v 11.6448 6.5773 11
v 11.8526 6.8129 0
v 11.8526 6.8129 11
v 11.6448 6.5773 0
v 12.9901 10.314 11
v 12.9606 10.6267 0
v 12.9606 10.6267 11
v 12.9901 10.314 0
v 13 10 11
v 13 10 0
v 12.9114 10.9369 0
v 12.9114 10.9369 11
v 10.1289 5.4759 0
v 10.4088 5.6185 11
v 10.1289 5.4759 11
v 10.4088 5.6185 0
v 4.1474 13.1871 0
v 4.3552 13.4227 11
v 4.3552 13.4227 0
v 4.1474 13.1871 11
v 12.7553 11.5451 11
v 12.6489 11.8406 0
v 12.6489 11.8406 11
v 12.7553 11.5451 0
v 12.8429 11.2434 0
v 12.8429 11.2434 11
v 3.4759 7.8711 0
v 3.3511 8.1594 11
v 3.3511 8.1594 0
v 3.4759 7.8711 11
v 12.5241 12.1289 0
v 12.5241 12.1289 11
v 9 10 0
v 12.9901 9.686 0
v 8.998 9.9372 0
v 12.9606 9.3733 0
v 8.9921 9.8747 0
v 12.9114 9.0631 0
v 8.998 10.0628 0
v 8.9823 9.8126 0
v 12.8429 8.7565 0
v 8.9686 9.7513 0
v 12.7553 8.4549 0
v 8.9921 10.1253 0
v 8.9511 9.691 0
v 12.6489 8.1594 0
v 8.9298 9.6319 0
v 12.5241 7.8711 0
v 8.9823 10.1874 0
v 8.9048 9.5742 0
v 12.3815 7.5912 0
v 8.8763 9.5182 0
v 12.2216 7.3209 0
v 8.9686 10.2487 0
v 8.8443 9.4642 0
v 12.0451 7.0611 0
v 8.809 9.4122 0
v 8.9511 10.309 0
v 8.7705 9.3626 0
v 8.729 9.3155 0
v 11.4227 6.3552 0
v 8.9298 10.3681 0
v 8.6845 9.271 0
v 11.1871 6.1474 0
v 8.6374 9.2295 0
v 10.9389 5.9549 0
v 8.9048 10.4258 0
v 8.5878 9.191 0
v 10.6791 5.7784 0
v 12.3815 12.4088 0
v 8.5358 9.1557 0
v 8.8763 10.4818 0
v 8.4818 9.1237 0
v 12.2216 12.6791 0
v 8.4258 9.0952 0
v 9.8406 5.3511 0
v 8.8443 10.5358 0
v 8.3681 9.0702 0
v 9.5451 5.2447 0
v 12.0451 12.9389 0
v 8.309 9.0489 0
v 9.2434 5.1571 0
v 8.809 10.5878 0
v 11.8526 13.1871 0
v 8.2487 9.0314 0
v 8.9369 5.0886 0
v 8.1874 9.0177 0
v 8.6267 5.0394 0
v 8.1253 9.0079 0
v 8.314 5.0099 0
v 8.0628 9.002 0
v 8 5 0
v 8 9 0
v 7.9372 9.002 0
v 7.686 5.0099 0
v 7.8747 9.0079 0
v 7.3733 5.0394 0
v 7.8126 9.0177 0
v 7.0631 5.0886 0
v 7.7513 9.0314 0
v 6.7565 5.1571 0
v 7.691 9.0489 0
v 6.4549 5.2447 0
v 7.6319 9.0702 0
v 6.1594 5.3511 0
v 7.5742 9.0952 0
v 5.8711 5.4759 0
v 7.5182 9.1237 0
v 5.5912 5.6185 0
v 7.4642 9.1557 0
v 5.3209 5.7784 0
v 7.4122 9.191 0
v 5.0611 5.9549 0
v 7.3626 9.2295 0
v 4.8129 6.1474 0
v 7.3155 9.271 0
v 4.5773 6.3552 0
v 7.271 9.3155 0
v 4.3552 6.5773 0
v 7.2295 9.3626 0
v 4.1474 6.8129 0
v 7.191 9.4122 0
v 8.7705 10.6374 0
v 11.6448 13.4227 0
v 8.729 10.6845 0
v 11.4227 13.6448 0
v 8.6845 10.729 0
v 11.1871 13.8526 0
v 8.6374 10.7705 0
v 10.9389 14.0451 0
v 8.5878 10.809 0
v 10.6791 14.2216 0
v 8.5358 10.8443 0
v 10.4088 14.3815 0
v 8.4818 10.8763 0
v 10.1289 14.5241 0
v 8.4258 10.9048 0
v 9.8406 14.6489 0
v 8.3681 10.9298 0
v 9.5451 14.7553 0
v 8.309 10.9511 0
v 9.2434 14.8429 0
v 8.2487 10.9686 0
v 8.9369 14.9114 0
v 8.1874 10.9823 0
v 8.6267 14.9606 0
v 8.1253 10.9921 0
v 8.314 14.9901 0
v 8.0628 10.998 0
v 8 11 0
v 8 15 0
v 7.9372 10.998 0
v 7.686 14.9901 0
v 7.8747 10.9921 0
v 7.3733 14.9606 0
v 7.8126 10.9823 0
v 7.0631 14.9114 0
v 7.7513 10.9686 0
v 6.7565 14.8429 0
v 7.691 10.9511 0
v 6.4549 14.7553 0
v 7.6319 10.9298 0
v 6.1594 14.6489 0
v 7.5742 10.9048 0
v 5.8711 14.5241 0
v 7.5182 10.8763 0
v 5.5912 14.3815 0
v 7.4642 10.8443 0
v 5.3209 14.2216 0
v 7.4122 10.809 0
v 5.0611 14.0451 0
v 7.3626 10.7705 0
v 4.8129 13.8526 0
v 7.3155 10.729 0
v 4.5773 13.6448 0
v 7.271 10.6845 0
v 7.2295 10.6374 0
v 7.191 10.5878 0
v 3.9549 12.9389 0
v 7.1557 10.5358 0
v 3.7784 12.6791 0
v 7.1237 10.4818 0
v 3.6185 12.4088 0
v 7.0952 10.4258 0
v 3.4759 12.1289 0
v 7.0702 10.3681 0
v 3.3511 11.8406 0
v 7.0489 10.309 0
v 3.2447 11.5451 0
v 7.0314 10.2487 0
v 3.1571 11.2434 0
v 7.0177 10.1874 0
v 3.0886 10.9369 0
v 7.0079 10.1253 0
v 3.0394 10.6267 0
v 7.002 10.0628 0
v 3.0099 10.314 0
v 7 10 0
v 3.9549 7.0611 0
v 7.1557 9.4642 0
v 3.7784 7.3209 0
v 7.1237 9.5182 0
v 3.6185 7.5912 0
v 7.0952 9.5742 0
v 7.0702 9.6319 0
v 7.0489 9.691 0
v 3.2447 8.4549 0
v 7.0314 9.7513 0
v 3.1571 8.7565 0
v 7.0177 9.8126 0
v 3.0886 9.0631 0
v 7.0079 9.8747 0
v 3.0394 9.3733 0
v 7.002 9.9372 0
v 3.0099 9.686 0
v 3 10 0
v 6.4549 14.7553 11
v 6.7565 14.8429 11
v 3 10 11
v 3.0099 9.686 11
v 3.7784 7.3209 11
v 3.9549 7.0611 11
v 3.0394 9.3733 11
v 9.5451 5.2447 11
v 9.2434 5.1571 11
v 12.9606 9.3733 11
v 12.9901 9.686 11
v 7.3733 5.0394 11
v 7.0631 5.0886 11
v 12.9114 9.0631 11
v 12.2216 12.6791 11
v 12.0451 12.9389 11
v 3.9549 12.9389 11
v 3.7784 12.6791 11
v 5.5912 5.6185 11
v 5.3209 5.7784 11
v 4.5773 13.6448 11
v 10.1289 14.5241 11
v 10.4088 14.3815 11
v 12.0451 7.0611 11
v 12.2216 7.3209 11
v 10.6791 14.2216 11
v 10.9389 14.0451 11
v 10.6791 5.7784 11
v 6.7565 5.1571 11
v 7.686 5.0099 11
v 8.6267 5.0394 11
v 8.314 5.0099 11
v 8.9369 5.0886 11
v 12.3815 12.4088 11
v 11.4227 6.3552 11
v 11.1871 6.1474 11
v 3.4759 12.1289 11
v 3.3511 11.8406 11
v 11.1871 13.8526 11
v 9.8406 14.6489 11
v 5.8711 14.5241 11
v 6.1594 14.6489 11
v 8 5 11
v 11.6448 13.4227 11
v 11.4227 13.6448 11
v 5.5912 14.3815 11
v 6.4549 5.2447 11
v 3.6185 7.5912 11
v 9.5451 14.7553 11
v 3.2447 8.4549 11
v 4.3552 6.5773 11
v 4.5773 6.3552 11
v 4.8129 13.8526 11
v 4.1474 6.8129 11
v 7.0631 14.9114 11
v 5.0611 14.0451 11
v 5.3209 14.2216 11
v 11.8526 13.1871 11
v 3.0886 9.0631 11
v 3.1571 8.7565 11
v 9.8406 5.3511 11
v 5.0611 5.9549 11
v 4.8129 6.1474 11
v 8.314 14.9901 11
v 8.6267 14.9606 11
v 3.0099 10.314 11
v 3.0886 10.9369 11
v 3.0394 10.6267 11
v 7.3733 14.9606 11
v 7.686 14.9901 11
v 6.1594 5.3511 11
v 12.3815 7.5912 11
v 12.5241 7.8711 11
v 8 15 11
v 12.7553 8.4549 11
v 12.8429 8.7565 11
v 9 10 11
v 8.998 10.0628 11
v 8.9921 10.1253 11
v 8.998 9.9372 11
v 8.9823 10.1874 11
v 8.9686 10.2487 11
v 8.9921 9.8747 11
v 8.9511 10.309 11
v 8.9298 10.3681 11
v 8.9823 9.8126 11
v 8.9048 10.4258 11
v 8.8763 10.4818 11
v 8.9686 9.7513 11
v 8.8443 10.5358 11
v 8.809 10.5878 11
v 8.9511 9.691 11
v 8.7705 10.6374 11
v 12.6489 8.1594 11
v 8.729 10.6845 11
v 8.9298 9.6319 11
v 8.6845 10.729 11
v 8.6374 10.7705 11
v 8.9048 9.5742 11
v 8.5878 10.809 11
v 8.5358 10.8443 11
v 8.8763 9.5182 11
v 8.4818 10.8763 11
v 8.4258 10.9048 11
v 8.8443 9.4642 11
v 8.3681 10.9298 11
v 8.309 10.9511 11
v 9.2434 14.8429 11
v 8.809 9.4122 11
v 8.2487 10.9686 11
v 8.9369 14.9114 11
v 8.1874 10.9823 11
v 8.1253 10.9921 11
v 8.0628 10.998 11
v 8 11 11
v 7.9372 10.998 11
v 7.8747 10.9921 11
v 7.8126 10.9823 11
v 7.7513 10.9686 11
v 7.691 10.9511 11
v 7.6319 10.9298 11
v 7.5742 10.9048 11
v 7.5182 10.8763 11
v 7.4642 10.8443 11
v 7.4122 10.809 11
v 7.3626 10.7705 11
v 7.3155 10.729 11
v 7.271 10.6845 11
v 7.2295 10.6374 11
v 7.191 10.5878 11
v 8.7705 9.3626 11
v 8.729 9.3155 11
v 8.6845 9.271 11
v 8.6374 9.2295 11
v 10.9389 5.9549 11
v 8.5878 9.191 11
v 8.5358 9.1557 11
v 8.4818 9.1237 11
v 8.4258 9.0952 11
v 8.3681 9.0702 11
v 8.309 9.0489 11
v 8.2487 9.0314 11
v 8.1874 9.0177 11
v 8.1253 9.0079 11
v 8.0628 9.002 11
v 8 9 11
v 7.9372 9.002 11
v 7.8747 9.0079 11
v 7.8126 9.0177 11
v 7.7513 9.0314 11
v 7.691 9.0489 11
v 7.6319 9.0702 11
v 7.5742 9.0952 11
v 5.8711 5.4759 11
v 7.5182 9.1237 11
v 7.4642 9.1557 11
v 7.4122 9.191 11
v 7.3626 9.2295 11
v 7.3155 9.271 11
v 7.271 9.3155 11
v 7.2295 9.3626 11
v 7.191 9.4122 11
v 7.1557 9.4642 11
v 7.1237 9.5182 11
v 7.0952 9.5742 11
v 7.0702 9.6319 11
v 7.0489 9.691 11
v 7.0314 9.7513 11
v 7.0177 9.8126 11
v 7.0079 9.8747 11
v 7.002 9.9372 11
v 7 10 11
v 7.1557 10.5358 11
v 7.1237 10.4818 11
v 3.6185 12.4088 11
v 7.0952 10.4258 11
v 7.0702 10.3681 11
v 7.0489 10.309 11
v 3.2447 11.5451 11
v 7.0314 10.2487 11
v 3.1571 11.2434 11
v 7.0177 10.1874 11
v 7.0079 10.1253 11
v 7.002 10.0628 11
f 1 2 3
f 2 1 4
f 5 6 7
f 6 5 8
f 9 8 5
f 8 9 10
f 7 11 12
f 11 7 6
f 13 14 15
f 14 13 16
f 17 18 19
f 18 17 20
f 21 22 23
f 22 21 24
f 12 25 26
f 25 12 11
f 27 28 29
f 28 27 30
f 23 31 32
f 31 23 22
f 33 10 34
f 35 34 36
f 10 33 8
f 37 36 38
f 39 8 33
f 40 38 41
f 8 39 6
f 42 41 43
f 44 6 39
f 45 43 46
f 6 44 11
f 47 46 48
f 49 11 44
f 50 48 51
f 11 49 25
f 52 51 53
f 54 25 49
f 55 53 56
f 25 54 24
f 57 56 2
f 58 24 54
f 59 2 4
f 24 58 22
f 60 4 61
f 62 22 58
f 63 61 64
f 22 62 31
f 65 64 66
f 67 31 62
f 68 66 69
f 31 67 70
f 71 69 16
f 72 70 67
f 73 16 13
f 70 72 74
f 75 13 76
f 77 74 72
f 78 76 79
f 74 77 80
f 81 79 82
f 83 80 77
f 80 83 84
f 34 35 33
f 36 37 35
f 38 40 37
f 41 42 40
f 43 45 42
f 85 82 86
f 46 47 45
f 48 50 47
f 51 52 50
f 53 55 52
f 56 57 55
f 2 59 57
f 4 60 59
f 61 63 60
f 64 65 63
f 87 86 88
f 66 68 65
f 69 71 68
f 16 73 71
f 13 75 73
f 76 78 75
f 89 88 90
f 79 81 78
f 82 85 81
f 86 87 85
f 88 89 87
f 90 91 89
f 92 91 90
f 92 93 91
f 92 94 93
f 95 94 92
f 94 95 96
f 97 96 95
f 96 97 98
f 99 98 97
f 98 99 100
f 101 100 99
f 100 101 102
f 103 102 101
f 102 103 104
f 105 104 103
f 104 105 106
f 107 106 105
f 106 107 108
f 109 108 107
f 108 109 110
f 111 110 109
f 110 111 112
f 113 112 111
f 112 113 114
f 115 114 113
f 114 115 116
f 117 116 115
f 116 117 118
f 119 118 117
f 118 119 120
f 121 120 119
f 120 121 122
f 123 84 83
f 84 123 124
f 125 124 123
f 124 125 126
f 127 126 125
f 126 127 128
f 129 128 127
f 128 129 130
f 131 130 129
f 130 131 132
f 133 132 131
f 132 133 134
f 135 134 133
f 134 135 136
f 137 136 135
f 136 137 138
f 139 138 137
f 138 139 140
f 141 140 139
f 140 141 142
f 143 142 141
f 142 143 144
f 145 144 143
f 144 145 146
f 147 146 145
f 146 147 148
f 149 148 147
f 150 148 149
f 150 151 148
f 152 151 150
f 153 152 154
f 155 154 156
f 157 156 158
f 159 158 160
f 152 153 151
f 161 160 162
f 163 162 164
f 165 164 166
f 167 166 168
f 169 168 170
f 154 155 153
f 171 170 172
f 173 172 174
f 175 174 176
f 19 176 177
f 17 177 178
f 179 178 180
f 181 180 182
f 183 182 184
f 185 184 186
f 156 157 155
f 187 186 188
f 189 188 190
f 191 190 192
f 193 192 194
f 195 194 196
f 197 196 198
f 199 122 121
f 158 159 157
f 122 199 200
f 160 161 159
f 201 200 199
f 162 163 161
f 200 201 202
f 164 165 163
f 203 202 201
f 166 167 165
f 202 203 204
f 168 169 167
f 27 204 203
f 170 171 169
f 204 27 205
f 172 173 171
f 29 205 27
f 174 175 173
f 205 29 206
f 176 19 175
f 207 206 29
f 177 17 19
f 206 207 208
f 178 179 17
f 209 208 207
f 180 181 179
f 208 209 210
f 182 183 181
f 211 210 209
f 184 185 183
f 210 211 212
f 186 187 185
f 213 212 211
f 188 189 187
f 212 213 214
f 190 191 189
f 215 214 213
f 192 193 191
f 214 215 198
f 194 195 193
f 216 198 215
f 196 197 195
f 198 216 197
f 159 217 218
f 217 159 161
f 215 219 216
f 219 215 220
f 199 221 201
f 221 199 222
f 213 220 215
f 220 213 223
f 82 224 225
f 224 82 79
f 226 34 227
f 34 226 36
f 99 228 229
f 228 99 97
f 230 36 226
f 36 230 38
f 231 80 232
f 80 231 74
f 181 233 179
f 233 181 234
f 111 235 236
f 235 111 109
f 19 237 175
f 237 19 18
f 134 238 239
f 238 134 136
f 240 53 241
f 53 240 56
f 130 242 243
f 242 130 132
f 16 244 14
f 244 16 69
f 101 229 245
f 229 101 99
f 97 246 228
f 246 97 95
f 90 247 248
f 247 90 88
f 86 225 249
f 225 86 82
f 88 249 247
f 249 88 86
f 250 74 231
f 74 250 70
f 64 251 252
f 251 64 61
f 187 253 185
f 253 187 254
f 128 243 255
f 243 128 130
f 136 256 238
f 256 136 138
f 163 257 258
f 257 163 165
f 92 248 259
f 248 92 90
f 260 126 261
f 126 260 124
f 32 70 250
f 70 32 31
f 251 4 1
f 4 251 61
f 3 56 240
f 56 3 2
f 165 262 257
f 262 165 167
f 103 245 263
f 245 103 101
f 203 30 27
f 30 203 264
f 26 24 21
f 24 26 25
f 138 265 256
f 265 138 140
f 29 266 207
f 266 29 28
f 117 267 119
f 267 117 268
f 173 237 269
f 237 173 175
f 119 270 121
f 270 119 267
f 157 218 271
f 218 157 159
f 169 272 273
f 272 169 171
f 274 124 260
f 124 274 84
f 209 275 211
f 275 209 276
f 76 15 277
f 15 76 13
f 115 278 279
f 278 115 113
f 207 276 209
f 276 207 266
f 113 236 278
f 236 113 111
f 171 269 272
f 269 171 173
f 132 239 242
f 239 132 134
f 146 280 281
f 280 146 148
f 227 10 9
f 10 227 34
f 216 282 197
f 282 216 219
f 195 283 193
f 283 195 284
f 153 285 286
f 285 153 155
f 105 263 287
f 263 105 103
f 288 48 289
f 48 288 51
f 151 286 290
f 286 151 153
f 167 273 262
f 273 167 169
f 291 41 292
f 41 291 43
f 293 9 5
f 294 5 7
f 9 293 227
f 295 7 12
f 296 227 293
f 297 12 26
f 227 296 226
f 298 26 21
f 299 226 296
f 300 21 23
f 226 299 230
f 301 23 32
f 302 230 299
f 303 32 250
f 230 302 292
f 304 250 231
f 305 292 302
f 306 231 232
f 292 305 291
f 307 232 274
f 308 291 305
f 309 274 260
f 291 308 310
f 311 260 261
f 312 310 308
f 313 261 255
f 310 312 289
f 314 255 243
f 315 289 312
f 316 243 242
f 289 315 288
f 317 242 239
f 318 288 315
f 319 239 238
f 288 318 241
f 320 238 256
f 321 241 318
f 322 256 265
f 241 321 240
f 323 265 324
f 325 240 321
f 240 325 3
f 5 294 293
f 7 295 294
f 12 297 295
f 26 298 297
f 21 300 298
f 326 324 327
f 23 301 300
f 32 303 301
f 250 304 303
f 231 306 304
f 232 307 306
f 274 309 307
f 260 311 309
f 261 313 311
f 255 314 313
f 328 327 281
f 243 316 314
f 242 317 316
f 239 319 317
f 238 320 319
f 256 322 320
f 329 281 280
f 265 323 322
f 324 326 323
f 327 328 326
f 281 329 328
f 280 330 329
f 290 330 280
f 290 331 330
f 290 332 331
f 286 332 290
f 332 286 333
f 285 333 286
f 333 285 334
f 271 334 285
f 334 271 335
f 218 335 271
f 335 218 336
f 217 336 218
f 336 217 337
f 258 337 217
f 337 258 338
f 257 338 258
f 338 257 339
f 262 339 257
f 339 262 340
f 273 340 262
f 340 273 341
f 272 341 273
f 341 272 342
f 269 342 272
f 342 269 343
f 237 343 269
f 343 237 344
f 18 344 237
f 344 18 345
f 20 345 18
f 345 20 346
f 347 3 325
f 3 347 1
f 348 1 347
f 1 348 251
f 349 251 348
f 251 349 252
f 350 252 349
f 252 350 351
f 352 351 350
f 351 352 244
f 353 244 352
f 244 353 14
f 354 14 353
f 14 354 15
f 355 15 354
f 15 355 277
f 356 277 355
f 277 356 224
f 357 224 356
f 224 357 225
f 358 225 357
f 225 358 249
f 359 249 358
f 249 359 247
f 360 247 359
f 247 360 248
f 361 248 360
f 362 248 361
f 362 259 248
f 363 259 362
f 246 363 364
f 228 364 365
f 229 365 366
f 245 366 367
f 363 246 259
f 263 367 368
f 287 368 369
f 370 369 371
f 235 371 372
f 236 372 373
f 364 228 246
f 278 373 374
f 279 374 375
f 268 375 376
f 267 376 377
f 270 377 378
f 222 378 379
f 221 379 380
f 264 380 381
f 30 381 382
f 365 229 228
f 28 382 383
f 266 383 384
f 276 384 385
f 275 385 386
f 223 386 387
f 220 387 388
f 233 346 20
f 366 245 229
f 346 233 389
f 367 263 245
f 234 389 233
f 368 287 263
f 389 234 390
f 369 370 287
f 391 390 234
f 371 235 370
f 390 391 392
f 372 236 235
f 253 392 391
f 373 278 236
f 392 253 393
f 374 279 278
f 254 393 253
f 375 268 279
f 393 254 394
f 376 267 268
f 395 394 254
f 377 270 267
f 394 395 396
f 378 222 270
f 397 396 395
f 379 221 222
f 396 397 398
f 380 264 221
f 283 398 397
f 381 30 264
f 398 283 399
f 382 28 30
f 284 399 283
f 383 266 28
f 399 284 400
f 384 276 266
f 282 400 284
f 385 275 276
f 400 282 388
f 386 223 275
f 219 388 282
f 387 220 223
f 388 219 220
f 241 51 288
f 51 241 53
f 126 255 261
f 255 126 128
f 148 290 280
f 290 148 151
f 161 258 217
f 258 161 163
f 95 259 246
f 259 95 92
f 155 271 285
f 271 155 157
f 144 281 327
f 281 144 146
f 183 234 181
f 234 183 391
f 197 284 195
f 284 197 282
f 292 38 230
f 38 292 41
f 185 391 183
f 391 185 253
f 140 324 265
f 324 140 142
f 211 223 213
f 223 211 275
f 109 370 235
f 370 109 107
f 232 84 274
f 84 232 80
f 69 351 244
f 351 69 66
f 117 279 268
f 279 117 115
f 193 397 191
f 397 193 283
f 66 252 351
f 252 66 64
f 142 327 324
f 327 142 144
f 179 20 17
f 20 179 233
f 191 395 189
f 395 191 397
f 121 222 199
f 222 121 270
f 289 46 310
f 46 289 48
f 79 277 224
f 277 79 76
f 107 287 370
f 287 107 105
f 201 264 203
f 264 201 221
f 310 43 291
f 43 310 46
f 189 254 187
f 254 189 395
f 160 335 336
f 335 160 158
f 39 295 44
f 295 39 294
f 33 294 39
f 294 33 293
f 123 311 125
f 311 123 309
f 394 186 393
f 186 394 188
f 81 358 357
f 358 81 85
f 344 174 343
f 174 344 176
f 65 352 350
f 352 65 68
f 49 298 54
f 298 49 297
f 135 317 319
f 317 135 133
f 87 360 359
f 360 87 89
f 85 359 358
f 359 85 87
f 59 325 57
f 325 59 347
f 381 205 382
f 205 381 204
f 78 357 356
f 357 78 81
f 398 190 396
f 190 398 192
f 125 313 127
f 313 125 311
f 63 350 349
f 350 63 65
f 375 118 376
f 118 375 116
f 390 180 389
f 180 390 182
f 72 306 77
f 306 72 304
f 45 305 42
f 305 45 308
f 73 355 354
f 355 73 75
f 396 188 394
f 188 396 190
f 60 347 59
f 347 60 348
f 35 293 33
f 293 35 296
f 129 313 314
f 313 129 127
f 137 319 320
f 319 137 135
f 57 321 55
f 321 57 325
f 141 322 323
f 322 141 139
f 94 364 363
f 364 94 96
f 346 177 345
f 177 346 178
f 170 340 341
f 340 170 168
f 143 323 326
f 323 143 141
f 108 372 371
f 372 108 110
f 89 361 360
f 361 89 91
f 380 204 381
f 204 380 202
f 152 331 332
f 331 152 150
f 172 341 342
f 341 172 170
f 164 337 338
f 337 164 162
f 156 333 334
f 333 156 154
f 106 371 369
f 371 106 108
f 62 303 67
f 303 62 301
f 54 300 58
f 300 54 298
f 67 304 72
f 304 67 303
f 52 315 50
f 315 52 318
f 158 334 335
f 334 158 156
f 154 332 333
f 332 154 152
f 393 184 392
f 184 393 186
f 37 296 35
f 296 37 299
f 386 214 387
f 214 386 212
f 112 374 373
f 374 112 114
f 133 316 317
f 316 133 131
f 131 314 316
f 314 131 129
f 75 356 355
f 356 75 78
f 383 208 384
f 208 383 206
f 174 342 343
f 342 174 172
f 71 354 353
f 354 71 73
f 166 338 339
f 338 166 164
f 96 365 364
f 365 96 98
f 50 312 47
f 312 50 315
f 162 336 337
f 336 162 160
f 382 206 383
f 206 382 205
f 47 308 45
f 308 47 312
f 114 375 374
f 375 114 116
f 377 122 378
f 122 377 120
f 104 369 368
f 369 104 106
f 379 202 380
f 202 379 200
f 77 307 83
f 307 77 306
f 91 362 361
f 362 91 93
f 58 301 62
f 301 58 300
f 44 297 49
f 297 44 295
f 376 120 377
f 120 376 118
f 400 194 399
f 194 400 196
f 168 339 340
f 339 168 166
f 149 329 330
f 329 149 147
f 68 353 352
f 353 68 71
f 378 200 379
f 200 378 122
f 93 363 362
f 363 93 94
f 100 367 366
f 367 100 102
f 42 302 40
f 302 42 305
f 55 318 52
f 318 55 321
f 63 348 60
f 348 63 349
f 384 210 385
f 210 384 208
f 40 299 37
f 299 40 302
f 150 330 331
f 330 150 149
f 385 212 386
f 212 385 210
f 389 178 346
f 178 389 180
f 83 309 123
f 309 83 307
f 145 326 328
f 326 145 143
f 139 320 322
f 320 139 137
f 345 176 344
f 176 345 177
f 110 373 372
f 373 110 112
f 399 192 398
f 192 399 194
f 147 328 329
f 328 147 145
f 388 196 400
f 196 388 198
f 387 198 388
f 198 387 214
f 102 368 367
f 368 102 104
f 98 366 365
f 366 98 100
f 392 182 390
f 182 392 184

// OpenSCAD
difference(){
	union(){
        
        translate([8,10,0]){
           cylinder(h=11, r=5, $fn=100, center=false);
        }
	}
	union() {
        translate([8,10,-5]){
            rotate(a = [0,0,0]) {
                cylinder(h=100, r=1, $fn=100, center=false);
            }
        }	
        

        
	}
}
